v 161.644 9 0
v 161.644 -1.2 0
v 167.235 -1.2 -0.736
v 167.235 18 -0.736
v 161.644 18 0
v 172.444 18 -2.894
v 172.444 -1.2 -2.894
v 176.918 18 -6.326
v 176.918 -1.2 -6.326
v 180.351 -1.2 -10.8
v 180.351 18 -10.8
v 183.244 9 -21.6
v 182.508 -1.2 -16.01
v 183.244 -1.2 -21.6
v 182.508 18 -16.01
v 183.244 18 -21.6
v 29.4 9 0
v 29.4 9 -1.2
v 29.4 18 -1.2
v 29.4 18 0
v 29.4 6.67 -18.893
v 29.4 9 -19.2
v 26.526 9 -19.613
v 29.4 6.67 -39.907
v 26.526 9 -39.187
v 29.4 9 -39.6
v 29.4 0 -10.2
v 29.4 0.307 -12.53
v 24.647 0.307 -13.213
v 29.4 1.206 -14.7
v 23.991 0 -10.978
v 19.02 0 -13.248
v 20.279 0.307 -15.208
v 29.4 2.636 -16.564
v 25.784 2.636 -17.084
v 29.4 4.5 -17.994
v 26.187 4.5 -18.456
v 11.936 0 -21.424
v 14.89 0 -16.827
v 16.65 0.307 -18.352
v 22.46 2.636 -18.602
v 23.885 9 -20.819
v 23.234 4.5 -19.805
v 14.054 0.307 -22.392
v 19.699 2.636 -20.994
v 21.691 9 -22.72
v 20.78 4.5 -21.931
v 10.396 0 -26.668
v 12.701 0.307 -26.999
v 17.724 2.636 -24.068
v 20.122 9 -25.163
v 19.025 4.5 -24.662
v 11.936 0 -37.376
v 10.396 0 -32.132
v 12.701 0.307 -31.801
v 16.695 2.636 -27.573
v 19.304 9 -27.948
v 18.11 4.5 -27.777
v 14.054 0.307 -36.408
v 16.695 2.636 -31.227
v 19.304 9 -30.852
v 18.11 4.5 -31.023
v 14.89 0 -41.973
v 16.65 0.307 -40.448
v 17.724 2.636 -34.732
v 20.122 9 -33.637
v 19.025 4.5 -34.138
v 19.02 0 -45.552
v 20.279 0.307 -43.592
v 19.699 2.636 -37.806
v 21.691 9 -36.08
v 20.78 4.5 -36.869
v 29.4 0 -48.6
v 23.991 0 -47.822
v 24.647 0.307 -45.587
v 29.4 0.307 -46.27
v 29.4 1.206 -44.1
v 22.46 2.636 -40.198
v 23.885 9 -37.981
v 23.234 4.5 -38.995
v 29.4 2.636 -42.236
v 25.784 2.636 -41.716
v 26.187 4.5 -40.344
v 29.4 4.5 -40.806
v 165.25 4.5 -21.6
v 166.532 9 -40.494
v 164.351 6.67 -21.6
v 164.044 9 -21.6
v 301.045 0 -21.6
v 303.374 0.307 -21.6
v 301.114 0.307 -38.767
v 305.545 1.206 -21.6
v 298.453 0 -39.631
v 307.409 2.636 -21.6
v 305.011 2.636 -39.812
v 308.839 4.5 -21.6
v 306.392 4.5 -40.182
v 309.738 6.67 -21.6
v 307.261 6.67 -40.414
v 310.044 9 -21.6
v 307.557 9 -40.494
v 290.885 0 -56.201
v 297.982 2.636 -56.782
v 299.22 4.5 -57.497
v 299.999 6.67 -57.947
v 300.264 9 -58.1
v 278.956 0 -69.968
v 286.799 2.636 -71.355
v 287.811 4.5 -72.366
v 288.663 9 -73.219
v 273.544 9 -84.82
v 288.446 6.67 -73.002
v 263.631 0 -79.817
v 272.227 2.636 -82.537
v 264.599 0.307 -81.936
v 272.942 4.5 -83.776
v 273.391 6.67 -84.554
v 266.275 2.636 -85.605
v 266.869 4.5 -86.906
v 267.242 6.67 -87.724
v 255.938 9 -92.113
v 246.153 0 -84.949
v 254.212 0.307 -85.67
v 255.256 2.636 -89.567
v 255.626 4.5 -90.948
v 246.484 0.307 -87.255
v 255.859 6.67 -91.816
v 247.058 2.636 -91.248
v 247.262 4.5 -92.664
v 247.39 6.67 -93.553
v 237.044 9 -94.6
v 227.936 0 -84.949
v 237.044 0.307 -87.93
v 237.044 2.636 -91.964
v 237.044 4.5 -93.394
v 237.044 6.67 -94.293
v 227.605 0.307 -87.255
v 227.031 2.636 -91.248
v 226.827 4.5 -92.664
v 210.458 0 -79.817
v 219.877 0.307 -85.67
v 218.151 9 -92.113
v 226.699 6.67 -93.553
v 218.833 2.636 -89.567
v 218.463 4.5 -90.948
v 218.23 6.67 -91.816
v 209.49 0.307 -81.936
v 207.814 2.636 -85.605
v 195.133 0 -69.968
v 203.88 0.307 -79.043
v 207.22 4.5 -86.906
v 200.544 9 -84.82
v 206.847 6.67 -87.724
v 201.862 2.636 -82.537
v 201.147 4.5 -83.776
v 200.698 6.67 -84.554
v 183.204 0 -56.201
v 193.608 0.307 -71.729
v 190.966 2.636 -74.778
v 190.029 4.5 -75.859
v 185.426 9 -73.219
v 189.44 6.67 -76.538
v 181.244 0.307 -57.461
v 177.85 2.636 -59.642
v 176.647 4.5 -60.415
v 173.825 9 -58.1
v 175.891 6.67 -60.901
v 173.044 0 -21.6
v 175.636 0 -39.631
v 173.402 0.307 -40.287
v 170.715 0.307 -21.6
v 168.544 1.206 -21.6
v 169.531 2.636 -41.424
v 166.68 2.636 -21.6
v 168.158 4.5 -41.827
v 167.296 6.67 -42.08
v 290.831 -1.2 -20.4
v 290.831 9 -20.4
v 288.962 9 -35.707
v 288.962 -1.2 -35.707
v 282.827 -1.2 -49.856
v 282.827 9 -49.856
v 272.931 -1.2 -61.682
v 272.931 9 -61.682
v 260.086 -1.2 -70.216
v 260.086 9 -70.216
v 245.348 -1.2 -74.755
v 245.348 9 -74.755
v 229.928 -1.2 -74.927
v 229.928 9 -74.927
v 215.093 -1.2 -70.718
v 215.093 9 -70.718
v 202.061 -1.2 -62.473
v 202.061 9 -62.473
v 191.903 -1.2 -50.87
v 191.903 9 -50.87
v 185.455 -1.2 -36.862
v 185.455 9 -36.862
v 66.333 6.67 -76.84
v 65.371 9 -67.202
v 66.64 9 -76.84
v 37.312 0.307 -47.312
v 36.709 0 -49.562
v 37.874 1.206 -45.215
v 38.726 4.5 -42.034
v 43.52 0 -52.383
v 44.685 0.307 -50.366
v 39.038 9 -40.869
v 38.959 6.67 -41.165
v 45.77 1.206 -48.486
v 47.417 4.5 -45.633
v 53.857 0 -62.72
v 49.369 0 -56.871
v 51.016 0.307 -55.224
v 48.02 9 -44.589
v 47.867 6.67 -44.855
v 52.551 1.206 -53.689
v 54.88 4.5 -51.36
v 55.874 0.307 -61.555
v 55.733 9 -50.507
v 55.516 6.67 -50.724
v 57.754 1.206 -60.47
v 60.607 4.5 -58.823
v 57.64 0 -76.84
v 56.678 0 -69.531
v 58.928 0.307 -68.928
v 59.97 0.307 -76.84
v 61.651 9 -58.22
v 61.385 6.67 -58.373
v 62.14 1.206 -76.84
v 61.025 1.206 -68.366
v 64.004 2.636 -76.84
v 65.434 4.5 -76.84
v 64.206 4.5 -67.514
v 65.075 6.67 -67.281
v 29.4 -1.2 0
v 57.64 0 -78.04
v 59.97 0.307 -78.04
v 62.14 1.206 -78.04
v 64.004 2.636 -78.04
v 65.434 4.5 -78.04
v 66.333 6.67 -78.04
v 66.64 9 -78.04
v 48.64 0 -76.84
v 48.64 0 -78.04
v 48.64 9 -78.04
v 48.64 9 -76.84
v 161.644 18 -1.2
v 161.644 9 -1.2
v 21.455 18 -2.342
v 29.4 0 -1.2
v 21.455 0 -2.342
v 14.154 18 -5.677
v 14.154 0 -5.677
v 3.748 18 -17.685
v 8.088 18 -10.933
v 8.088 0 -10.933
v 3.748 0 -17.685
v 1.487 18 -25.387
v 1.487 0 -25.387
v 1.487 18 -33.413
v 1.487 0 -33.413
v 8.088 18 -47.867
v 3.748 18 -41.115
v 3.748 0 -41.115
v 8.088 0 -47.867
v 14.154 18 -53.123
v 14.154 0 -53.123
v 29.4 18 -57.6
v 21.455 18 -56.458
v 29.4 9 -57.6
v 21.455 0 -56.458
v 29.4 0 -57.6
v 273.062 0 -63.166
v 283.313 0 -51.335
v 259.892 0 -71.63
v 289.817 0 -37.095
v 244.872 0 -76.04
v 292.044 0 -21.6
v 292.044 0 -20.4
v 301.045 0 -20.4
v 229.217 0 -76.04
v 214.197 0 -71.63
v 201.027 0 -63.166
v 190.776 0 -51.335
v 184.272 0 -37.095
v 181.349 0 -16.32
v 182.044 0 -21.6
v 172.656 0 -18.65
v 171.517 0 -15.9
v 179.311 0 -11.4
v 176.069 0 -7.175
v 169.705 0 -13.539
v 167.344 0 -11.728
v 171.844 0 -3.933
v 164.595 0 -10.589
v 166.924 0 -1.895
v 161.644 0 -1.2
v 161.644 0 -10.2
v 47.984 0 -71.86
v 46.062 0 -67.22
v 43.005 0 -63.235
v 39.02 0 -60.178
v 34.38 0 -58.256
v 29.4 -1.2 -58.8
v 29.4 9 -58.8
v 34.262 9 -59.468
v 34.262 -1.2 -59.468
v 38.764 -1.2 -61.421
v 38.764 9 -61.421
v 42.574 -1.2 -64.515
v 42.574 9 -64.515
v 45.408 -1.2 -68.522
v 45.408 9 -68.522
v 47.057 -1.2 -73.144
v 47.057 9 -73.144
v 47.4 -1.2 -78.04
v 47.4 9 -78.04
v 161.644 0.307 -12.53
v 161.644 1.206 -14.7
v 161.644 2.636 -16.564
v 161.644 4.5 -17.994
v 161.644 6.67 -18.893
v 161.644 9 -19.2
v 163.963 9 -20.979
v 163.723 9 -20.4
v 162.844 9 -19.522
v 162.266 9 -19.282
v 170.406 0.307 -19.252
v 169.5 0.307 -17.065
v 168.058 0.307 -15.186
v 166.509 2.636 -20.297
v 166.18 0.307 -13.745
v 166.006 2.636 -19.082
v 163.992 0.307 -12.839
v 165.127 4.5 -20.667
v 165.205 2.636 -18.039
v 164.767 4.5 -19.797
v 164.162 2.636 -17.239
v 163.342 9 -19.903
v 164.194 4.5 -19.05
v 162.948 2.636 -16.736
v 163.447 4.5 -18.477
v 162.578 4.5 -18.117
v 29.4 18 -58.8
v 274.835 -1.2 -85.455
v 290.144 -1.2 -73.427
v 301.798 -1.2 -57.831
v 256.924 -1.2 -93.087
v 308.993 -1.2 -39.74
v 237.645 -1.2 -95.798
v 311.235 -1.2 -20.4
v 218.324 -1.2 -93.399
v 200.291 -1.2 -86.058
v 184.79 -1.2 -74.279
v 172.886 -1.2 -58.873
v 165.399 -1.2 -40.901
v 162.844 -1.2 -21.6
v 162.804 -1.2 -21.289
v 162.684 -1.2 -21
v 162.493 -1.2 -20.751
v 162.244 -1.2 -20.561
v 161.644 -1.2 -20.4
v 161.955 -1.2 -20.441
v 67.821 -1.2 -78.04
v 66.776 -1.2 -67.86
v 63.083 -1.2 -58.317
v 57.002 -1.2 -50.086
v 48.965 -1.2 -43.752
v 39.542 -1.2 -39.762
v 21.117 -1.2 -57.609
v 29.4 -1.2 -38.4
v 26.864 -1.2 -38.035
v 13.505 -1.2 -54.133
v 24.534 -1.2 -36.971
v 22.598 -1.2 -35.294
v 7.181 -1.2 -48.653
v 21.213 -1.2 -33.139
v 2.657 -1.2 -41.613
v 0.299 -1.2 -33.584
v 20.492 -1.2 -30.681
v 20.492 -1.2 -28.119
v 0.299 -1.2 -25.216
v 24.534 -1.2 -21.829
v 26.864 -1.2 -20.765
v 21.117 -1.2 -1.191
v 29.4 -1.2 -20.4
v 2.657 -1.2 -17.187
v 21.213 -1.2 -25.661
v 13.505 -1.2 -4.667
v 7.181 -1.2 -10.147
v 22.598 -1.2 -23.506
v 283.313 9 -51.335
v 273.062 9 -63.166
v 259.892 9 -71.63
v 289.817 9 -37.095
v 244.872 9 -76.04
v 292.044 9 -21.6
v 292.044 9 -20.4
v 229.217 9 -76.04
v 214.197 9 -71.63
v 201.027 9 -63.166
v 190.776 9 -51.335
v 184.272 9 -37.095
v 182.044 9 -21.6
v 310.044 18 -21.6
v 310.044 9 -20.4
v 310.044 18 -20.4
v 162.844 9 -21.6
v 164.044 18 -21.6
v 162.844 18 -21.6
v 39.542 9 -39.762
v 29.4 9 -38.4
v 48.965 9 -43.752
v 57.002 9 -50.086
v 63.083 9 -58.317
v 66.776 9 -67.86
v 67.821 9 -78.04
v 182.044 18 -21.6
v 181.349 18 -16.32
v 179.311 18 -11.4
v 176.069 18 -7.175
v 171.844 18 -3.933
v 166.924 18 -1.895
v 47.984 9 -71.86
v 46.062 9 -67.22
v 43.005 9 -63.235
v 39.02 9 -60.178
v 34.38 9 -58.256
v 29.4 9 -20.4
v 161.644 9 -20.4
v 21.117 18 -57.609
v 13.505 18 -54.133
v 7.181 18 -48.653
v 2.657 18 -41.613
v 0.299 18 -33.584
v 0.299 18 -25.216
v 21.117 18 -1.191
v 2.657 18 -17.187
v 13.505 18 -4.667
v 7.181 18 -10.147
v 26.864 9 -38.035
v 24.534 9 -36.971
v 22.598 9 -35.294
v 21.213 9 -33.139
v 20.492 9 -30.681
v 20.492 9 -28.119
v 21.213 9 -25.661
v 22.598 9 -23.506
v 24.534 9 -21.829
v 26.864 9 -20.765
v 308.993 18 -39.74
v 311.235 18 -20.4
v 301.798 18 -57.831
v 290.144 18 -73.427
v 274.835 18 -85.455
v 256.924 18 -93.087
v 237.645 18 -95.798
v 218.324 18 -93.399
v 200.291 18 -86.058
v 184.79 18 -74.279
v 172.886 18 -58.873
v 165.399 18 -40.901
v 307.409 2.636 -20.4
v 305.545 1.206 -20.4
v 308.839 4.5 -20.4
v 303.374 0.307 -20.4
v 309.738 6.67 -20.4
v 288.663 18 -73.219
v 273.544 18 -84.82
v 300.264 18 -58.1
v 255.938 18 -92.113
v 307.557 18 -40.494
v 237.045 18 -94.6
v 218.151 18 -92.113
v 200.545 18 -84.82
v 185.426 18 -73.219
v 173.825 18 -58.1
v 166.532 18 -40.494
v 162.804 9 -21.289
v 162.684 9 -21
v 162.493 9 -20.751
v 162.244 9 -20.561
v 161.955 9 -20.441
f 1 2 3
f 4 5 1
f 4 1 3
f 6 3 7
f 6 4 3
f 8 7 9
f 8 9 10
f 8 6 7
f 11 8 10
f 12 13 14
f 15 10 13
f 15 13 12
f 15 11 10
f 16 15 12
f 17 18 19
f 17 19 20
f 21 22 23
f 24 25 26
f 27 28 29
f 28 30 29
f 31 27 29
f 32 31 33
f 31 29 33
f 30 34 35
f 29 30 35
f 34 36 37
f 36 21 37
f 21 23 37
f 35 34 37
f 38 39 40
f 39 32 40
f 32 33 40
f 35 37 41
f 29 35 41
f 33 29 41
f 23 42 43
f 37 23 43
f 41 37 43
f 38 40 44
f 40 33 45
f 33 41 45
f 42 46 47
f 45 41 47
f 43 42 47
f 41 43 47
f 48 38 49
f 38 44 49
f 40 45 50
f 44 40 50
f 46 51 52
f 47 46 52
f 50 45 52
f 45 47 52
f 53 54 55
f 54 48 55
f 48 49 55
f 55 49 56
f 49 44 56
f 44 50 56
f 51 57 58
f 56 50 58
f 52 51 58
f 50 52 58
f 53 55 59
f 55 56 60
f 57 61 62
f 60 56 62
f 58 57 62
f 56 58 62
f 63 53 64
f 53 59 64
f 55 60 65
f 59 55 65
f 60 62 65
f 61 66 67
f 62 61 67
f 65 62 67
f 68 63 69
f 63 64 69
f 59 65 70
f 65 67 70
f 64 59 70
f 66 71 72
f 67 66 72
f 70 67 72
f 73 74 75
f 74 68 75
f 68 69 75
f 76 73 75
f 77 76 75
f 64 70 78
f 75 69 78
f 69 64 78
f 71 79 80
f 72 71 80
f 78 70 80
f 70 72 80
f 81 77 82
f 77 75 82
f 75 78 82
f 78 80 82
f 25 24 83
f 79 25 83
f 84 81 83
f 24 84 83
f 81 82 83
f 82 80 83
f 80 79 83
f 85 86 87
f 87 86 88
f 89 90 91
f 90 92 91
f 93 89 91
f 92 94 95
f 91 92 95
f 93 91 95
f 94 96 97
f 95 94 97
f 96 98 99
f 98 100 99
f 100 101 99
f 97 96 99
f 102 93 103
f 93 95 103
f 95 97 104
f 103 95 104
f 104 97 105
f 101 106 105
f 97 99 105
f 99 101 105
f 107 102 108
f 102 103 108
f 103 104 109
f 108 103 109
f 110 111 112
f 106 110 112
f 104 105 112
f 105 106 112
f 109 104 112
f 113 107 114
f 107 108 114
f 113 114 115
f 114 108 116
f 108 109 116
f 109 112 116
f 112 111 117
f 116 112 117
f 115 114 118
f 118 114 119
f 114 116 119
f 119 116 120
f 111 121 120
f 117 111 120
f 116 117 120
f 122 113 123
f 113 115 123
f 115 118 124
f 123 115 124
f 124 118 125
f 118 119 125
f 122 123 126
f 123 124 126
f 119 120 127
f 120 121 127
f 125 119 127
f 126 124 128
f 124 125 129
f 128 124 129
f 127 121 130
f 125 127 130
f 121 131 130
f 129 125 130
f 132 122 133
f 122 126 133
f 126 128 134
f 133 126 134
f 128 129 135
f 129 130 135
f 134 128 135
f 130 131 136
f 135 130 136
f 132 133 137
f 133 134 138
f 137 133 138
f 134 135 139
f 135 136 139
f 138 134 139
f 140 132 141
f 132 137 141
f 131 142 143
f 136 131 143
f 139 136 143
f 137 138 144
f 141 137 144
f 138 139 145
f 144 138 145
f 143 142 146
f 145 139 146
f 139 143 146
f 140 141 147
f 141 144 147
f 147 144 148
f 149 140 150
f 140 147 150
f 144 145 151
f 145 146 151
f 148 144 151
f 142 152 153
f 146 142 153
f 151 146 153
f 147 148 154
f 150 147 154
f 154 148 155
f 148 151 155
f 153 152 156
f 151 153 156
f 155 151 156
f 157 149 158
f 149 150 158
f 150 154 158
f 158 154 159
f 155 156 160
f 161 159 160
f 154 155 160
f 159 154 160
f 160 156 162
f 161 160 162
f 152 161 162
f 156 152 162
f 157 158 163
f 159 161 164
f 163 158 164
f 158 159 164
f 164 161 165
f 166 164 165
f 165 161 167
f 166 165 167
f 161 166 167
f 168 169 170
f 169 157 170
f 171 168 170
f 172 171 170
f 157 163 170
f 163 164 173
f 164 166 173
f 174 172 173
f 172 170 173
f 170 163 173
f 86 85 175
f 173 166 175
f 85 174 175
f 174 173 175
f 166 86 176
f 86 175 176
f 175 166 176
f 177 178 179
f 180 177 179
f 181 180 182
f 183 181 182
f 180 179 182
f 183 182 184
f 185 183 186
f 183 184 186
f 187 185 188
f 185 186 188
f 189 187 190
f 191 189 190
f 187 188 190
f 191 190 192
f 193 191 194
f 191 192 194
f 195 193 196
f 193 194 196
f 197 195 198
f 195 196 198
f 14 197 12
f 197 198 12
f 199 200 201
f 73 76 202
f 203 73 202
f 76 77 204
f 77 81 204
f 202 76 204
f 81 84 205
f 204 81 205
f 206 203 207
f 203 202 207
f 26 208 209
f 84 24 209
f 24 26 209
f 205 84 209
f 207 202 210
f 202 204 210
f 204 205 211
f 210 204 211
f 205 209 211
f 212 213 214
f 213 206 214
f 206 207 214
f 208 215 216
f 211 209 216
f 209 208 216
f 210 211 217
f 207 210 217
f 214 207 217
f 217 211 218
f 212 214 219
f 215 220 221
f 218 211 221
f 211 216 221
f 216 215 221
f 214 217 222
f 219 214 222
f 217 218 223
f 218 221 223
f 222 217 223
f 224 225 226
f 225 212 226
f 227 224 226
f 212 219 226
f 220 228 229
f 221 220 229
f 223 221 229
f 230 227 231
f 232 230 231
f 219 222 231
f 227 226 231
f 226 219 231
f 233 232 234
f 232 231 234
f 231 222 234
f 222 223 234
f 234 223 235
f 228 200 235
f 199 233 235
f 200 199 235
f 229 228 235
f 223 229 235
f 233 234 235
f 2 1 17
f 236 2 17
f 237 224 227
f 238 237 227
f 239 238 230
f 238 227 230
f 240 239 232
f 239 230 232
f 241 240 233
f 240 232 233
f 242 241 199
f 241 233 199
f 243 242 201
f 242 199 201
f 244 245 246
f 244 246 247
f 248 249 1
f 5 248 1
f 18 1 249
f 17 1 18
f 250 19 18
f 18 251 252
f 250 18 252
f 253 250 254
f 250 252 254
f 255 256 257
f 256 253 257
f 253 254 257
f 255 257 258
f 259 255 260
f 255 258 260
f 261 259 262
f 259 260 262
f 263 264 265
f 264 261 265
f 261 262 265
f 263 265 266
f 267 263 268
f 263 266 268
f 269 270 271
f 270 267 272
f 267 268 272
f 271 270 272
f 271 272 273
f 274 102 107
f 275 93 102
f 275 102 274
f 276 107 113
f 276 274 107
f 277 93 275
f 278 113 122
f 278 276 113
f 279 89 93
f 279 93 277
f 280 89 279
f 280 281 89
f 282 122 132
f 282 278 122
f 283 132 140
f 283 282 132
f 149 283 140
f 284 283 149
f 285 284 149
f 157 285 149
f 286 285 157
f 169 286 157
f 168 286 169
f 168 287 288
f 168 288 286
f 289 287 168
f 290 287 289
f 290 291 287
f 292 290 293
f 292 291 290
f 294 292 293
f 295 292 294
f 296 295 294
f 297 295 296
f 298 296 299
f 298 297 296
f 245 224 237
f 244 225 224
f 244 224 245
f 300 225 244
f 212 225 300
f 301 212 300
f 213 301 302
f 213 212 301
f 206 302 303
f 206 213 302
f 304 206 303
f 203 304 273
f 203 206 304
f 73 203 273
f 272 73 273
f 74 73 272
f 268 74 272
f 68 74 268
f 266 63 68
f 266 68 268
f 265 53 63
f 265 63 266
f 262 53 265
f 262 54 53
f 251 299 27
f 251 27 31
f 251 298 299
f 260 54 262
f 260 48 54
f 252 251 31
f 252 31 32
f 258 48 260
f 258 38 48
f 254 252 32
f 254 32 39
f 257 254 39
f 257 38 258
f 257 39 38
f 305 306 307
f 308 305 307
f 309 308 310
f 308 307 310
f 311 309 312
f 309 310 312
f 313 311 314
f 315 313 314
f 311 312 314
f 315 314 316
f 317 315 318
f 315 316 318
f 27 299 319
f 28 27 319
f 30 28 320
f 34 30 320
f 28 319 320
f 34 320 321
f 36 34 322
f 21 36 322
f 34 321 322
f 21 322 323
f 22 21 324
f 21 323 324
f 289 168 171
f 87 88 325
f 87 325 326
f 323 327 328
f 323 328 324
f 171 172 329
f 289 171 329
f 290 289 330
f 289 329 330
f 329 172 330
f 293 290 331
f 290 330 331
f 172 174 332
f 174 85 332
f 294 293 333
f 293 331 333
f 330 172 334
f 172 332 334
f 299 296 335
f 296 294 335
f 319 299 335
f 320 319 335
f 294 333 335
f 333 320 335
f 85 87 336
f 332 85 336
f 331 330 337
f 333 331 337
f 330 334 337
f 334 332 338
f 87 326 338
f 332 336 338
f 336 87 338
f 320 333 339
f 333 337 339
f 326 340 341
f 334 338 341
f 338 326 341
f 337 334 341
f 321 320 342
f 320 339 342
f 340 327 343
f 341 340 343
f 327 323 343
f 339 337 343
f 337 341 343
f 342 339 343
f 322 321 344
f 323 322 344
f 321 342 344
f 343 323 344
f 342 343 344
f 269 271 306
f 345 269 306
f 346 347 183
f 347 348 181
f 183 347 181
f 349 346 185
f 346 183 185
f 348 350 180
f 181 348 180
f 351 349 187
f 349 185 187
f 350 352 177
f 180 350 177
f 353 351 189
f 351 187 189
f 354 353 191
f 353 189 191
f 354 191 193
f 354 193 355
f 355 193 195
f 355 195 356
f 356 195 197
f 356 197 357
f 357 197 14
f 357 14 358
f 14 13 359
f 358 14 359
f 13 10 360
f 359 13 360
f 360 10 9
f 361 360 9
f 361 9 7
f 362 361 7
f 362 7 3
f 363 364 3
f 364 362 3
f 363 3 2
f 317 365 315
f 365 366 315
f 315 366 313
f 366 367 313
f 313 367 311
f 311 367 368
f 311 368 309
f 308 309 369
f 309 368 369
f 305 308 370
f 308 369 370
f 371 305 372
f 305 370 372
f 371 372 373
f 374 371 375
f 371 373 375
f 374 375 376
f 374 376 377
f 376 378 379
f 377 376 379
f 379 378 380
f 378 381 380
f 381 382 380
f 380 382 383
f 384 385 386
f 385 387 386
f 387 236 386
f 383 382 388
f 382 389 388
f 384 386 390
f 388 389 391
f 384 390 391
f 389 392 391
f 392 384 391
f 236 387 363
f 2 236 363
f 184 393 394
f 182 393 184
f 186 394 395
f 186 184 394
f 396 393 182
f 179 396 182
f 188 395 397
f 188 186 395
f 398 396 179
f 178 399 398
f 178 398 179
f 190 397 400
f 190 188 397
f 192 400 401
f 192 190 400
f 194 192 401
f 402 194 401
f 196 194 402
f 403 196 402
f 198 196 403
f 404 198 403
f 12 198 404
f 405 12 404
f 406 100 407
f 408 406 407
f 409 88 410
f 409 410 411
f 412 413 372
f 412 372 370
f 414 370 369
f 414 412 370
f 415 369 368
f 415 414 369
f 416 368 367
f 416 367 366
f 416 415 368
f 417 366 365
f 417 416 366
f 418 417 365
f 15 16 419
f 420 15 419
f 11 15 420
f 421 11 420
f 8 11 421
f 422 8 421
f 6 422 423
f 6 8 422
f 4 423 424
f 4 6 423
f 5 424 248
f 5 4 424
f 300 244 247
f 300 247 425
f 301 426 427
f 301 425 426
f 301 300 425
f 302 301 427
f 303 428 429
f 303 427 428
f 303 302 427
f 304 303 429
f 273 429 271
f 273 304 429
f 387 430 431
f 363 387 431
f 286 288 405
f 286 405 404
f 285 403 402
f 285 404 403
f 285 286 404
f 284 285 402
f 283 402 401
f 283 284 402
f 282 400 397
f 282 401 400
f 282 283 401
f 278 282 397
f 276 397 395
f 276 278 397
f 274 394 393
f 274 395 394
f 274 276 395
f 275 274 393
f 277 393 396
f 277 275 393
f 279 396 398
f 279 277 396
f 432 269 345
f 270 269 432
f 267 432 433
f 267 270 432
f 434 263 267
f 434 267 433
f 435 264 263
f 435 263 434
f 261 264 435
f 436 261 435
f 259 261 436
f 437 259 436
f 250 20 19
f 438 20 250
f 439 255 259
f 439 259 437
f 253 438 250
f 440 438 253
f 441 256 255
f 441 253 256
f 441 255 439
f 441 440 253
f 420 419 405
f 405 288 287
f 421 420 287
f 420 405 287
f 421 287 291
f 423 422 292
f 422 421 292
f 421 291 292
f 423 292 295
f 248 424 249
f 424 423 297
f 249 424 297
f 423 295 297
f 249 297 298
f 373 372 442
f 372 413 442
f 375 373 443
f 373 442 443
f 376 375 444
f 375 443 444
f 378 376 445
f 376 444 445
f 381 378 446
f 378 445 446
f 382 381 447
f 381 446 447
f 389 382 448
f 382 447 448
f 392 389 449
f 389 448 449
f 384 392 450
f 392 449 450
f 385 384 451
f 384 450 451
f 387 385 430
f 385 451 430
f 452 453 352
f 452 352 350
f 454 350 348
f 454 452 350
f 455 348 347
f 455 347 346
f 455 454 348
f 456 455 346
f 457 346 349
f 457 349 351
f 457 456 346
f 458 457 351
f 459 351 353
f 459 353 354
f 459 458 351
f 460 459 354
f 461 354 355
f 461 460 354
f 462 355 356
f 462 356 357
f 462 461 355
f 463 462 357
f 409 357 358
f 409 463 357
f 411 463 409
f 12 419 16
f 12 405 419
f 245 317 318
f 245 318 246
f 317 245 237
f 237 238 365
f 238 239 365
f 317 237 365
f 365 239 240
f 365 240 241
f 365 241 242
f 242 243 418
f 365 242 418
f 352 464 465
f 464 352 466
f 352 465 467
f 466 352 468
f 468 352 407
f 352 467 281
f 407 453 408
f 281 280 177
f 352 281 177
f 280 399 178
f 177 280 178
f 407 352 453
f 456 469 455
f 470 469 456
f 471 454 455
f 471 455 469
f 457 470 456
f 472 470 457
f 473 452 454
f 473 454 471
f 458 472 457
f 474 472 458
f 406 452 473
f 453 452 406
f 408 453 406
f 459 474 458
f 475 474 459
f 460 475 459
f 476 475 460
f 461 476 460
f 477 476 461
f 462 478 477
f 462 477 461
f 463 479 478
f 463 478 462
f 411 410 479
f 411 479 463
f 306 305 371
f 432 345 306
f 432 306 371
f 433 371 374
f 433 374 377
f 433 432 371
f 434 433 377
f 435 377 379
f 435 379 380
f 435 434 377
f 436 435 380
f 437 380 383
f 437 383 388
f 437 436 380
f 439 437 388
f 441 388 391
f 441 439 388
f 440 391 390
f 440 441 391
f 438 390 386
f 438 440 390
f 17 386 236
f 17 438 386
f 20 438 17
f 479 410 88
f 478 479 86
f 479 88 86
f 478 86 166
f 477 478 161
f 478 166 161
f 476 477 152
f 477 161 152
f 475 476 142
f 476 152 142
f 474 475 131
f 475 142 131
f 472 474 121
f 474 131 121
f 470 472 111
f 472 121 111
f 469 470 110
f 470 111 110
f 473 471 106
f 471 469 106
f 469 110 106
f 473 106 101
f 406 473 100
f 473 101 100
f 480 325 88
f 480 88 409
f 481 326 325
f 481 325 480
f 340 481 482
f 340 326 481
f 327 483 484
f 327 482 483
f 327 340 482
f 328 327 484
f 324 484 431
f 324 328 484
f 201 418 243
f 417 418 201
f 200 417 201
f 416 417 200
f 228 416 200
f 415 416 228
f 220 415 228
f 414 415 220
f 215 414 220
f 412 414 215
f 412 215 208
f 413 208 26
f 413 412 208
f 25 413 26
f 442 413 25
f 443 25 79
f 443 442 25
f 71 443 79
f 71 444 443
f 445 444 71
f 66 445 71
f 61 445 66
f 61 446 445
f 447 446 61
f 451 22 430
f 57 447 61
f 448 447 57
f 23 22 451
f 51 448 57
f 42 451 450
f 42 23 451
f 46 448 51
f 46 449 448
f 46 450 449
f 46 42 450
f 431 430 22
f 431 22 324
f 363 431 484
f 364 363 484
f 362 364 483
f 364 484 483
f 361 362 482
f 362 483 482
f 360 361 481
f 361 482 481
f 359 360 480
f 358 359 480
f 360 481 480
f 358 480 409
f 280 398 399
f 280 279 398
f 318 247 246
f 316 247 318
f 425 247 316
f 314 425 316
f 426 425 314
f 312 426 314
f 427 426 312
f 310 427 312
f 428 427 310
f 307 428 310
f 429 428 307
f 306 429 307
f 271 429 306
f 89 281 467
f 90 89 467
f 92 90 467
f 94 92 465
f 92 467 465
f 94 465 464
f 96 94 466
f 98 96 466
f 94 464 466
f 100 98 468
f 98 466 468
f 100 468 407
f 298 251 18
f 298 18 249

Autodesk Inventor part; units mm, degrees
ref_plane "YZ Plane" through (0, 0, 0) normal (1, 0, 0) x (0, 1, 0)
ref_plane "XZ Plane" through (0, 0, 0) normal (0, 1, 0) x (-1, 0, 0)
ref_plane "XY Plane" through (0, 0, 0) normal (0, 0, 1) x (1, 0, 0)
sketch "Esboço1" plane through (0, 0, 0) normal (0, 1, 0) x (-1, 0, 0)
  arc A0 (-292.0445, -21.6) -> (-182.0445, -21.6) centre (-237.0445, -21.6) ccw
  line L0 (-292.0445, -21.6) -> (-237.0445, -21.6) construction
  line L1 (-182.0445, -21.6) -> (-237.0445, -21.6) construction
  arc A1 (-161.6445, -1.2) -> (-182.0445, -21.6) centre (-161.6445, -21.6) ccw
  line L2 (-182.0445, -21.6) -> (-161.6445, -21.6) construction
  line L3 (-161.6445, -1.2) -> (-161.6445, -21.6) construction
  arc A2 (-29.4, -57.6) -> (-29.4, -1.2) centre (-29.4, -29.4) ccw
  line L4 (-29.4, -1.2) -> (-29.4, -29.4) construction
  line L5 (-29.4, -57.6) -> (-29.4, -29.4) construction
  arc A3 (-29.4, -57.6) -> (-48.64, -76.8399) centre (-29.4, -76.8399) ccw
  line L6 (-29.4, -57.6) -> (-29.4, -76.8399) construction
  line L7 (-48.64, -76.8399) -> (-29.4, -76.8399) construction
  line L8 (-29.4, -1.2) -> (-161.6445, -1.2)
  arc A4 (-310.0445, -21.6) -> (-164.0445, -21.6) centre (-237.0445, -21.6) ccw
  arc A5 (-161.6445, -19.2) -> (-164.0445, -21.6) centre (-161.6445, -21.6) ccw
  line L9 (-161.6445, -19.2) -> (-29.4, -19.2)
  arc A6 (-29.4, -39.6) -> (-29.4, -19.2) centre (-29.4, -29.4) ccw
  arc A7 (-29.4, -39.6) -> (-66.64, -76.8399) centre (-29.4, -76.8399) ccw
  line L10 (-48.64, -76.8399) -> (-66.64, -76.8399)
  line L11 (-292.0445, -21.6) -> (-310.0445, -21.6)
  arc A8 (-311.2348, -20.4) -> (-162.8445, -21.6) centre (-237.0445, -21.6) ccw
  line L12 (-311.2348, -20.4) -> (-290.8311, -20.4)
  arc A9 (-290.8311, -20.4) -> (-183.2445, -21.6) centre (-237.0445, -21.6) ccw
  arc A10 (-161.6445, 0) -> (-183.2445, -21.6) centre (-161.6445, -21.6) ccw
  line L13 (-161.6445, 0) -> (-29.4, 0)
  arc A11 (-29.4, -58.8) -> (-29.4, 0) centre (-29.4, -29.4) ccw
  arc A12 (-29.4, -58.8) -> (-47.4, -78.0399) centre (-29.4, -76.8399) ccw
  line L14 (-47.4, -78.0399) -> (-67.8212, -78.0399)
  arc A13 (-29.4, -38.4) -> (-67.8212, -78.0399) centre (-29.4, -76.8399) ccw
  arc A14 (-29.4, -38.4) -> (-29.4, -20.4) centre (-29.4, -29.4) ccw
  line L15 (-29.4, -20.4) -> (-161.6445, -20.4)
  arc A15 (-161.6445, -20.4) -> (-162.8445, -21.6) centre (-161.6445, -21.6) ccw
  line L16 (-66.64, -76.8399) -> (-66.64, -78.0399)
  line L17 (-48.64, -78.0399) -> (-48.64, -76.8399)
  line L18 (-310.0445, -21.6) -> (-310.0445, -20.4)
  line L19 (-292.0445, -21.6) -> (-292.0445, -20.4)
  line L20 (-164.0445, -21.6) -> (-162.8445, -21.6)
  line L21 (-182.0445, -21.6) -> (-183.2445, -21.6)
  line L22 (-161.6445, -1.2) -> (-161.6445, 0)
  line L23 (-161.6445, -20.4) -> (-161.6445, -19.2)
  line L24 (-29.4, -38.4) -> (-29.4, -39.6)
  line L25 (-29.4, -57.6) -> (-29.4, -58.8)
  line L26 (-29.4, -1.2) -> (-29.4, 0)
  point P0 (0, 0)
  point P1 (-163.4445, -21.6)
  point P2 (-95.5222, 0)
  point P3 (0, -29.4)
  point P4 (-95.5222, -20.4)
  point P5 (-301.0329, -20.4)
  point P6 (-161.6445, -0.6)
  point P7 (-182.6445, -21.6)
  point P8 (-161.6445, -19.8)
  point P9 (-183.2445, -21.6)
  point P10 (-182.0445, -21.6)
  point P11 (-161.6445, 0)
  point P12 (-161.6445, -1.2)
  point P13 (-164.0445, -21.6)
  point P14 (-162.8445, -21.6)
  point P15 (-29.4, -39)
  point P16 (-29.4, -58.2)
  point P17 (-29.4, -0.6)
  point P18 (-29.4, -58.8)
  point P19 (-29.4, -57.6)
  point P20 (-29.4, -1.2)
  point P21 (-29.4, 0)
  dimension "d22" = 180
  dimension "d23" = 110
  dimension "d24" = 90
  dimension "d25" = 180
  dimension "d26" = 90
  dimension "d27" = 18
  dimension "d28" = 18
  dimension "d29" = 18
  dimension "d30" = 20.4
  dimension "d31" = 1.2
  dimension "d32" = 18
  dimension "d33" = 132.2445
extrude "Extrusão1" add sketch "Esboço1" against normal blind 1.2
extrude "Extrusão2" add sketch "Esboço1" along normal blind 9 contours L19 L12 A9 L21 A0 | L22 L13 L26 L8 | A5 L23 A15 L20 | L9 A6 L24 A14 L15 L23 | L25 A12 L14 L17 A3 | A7 L16 L14 A13 L24
extrude "Extrusão3" add sketch "Esboço1" along normal blind 18 contours L21 A10 L22 A1 | A4 L20 A8 L12 L18 | L26 A11 L25 A2
fillet "Arredondamento2" radius 9 7 edges at (19.2, 0, -29.4) (55.7326, 0, -50.5073) (66.64, 0, -77.4399) (163.3415, 0, -19.9029) (237.0445, 0, -94.6) (310.0445, 0, -21) (95.5222, 0, -19.2)
equation "\"d27\" = Diâmetro_esfera"
equation "\"d28\" = Diâmetro_esfera"
equation "\"d29\" = Diâmetro_esfera"
equation "\"Diâmetro_esfera\" = 18"
equation "\"Filamento\" = 0.4"
equation "\"Margem\" = 3 * Filamento"
equation "\"Parafuso\" = 3"
properties part number "Agrupar bolinhas novamente" material "Plástico PET"
